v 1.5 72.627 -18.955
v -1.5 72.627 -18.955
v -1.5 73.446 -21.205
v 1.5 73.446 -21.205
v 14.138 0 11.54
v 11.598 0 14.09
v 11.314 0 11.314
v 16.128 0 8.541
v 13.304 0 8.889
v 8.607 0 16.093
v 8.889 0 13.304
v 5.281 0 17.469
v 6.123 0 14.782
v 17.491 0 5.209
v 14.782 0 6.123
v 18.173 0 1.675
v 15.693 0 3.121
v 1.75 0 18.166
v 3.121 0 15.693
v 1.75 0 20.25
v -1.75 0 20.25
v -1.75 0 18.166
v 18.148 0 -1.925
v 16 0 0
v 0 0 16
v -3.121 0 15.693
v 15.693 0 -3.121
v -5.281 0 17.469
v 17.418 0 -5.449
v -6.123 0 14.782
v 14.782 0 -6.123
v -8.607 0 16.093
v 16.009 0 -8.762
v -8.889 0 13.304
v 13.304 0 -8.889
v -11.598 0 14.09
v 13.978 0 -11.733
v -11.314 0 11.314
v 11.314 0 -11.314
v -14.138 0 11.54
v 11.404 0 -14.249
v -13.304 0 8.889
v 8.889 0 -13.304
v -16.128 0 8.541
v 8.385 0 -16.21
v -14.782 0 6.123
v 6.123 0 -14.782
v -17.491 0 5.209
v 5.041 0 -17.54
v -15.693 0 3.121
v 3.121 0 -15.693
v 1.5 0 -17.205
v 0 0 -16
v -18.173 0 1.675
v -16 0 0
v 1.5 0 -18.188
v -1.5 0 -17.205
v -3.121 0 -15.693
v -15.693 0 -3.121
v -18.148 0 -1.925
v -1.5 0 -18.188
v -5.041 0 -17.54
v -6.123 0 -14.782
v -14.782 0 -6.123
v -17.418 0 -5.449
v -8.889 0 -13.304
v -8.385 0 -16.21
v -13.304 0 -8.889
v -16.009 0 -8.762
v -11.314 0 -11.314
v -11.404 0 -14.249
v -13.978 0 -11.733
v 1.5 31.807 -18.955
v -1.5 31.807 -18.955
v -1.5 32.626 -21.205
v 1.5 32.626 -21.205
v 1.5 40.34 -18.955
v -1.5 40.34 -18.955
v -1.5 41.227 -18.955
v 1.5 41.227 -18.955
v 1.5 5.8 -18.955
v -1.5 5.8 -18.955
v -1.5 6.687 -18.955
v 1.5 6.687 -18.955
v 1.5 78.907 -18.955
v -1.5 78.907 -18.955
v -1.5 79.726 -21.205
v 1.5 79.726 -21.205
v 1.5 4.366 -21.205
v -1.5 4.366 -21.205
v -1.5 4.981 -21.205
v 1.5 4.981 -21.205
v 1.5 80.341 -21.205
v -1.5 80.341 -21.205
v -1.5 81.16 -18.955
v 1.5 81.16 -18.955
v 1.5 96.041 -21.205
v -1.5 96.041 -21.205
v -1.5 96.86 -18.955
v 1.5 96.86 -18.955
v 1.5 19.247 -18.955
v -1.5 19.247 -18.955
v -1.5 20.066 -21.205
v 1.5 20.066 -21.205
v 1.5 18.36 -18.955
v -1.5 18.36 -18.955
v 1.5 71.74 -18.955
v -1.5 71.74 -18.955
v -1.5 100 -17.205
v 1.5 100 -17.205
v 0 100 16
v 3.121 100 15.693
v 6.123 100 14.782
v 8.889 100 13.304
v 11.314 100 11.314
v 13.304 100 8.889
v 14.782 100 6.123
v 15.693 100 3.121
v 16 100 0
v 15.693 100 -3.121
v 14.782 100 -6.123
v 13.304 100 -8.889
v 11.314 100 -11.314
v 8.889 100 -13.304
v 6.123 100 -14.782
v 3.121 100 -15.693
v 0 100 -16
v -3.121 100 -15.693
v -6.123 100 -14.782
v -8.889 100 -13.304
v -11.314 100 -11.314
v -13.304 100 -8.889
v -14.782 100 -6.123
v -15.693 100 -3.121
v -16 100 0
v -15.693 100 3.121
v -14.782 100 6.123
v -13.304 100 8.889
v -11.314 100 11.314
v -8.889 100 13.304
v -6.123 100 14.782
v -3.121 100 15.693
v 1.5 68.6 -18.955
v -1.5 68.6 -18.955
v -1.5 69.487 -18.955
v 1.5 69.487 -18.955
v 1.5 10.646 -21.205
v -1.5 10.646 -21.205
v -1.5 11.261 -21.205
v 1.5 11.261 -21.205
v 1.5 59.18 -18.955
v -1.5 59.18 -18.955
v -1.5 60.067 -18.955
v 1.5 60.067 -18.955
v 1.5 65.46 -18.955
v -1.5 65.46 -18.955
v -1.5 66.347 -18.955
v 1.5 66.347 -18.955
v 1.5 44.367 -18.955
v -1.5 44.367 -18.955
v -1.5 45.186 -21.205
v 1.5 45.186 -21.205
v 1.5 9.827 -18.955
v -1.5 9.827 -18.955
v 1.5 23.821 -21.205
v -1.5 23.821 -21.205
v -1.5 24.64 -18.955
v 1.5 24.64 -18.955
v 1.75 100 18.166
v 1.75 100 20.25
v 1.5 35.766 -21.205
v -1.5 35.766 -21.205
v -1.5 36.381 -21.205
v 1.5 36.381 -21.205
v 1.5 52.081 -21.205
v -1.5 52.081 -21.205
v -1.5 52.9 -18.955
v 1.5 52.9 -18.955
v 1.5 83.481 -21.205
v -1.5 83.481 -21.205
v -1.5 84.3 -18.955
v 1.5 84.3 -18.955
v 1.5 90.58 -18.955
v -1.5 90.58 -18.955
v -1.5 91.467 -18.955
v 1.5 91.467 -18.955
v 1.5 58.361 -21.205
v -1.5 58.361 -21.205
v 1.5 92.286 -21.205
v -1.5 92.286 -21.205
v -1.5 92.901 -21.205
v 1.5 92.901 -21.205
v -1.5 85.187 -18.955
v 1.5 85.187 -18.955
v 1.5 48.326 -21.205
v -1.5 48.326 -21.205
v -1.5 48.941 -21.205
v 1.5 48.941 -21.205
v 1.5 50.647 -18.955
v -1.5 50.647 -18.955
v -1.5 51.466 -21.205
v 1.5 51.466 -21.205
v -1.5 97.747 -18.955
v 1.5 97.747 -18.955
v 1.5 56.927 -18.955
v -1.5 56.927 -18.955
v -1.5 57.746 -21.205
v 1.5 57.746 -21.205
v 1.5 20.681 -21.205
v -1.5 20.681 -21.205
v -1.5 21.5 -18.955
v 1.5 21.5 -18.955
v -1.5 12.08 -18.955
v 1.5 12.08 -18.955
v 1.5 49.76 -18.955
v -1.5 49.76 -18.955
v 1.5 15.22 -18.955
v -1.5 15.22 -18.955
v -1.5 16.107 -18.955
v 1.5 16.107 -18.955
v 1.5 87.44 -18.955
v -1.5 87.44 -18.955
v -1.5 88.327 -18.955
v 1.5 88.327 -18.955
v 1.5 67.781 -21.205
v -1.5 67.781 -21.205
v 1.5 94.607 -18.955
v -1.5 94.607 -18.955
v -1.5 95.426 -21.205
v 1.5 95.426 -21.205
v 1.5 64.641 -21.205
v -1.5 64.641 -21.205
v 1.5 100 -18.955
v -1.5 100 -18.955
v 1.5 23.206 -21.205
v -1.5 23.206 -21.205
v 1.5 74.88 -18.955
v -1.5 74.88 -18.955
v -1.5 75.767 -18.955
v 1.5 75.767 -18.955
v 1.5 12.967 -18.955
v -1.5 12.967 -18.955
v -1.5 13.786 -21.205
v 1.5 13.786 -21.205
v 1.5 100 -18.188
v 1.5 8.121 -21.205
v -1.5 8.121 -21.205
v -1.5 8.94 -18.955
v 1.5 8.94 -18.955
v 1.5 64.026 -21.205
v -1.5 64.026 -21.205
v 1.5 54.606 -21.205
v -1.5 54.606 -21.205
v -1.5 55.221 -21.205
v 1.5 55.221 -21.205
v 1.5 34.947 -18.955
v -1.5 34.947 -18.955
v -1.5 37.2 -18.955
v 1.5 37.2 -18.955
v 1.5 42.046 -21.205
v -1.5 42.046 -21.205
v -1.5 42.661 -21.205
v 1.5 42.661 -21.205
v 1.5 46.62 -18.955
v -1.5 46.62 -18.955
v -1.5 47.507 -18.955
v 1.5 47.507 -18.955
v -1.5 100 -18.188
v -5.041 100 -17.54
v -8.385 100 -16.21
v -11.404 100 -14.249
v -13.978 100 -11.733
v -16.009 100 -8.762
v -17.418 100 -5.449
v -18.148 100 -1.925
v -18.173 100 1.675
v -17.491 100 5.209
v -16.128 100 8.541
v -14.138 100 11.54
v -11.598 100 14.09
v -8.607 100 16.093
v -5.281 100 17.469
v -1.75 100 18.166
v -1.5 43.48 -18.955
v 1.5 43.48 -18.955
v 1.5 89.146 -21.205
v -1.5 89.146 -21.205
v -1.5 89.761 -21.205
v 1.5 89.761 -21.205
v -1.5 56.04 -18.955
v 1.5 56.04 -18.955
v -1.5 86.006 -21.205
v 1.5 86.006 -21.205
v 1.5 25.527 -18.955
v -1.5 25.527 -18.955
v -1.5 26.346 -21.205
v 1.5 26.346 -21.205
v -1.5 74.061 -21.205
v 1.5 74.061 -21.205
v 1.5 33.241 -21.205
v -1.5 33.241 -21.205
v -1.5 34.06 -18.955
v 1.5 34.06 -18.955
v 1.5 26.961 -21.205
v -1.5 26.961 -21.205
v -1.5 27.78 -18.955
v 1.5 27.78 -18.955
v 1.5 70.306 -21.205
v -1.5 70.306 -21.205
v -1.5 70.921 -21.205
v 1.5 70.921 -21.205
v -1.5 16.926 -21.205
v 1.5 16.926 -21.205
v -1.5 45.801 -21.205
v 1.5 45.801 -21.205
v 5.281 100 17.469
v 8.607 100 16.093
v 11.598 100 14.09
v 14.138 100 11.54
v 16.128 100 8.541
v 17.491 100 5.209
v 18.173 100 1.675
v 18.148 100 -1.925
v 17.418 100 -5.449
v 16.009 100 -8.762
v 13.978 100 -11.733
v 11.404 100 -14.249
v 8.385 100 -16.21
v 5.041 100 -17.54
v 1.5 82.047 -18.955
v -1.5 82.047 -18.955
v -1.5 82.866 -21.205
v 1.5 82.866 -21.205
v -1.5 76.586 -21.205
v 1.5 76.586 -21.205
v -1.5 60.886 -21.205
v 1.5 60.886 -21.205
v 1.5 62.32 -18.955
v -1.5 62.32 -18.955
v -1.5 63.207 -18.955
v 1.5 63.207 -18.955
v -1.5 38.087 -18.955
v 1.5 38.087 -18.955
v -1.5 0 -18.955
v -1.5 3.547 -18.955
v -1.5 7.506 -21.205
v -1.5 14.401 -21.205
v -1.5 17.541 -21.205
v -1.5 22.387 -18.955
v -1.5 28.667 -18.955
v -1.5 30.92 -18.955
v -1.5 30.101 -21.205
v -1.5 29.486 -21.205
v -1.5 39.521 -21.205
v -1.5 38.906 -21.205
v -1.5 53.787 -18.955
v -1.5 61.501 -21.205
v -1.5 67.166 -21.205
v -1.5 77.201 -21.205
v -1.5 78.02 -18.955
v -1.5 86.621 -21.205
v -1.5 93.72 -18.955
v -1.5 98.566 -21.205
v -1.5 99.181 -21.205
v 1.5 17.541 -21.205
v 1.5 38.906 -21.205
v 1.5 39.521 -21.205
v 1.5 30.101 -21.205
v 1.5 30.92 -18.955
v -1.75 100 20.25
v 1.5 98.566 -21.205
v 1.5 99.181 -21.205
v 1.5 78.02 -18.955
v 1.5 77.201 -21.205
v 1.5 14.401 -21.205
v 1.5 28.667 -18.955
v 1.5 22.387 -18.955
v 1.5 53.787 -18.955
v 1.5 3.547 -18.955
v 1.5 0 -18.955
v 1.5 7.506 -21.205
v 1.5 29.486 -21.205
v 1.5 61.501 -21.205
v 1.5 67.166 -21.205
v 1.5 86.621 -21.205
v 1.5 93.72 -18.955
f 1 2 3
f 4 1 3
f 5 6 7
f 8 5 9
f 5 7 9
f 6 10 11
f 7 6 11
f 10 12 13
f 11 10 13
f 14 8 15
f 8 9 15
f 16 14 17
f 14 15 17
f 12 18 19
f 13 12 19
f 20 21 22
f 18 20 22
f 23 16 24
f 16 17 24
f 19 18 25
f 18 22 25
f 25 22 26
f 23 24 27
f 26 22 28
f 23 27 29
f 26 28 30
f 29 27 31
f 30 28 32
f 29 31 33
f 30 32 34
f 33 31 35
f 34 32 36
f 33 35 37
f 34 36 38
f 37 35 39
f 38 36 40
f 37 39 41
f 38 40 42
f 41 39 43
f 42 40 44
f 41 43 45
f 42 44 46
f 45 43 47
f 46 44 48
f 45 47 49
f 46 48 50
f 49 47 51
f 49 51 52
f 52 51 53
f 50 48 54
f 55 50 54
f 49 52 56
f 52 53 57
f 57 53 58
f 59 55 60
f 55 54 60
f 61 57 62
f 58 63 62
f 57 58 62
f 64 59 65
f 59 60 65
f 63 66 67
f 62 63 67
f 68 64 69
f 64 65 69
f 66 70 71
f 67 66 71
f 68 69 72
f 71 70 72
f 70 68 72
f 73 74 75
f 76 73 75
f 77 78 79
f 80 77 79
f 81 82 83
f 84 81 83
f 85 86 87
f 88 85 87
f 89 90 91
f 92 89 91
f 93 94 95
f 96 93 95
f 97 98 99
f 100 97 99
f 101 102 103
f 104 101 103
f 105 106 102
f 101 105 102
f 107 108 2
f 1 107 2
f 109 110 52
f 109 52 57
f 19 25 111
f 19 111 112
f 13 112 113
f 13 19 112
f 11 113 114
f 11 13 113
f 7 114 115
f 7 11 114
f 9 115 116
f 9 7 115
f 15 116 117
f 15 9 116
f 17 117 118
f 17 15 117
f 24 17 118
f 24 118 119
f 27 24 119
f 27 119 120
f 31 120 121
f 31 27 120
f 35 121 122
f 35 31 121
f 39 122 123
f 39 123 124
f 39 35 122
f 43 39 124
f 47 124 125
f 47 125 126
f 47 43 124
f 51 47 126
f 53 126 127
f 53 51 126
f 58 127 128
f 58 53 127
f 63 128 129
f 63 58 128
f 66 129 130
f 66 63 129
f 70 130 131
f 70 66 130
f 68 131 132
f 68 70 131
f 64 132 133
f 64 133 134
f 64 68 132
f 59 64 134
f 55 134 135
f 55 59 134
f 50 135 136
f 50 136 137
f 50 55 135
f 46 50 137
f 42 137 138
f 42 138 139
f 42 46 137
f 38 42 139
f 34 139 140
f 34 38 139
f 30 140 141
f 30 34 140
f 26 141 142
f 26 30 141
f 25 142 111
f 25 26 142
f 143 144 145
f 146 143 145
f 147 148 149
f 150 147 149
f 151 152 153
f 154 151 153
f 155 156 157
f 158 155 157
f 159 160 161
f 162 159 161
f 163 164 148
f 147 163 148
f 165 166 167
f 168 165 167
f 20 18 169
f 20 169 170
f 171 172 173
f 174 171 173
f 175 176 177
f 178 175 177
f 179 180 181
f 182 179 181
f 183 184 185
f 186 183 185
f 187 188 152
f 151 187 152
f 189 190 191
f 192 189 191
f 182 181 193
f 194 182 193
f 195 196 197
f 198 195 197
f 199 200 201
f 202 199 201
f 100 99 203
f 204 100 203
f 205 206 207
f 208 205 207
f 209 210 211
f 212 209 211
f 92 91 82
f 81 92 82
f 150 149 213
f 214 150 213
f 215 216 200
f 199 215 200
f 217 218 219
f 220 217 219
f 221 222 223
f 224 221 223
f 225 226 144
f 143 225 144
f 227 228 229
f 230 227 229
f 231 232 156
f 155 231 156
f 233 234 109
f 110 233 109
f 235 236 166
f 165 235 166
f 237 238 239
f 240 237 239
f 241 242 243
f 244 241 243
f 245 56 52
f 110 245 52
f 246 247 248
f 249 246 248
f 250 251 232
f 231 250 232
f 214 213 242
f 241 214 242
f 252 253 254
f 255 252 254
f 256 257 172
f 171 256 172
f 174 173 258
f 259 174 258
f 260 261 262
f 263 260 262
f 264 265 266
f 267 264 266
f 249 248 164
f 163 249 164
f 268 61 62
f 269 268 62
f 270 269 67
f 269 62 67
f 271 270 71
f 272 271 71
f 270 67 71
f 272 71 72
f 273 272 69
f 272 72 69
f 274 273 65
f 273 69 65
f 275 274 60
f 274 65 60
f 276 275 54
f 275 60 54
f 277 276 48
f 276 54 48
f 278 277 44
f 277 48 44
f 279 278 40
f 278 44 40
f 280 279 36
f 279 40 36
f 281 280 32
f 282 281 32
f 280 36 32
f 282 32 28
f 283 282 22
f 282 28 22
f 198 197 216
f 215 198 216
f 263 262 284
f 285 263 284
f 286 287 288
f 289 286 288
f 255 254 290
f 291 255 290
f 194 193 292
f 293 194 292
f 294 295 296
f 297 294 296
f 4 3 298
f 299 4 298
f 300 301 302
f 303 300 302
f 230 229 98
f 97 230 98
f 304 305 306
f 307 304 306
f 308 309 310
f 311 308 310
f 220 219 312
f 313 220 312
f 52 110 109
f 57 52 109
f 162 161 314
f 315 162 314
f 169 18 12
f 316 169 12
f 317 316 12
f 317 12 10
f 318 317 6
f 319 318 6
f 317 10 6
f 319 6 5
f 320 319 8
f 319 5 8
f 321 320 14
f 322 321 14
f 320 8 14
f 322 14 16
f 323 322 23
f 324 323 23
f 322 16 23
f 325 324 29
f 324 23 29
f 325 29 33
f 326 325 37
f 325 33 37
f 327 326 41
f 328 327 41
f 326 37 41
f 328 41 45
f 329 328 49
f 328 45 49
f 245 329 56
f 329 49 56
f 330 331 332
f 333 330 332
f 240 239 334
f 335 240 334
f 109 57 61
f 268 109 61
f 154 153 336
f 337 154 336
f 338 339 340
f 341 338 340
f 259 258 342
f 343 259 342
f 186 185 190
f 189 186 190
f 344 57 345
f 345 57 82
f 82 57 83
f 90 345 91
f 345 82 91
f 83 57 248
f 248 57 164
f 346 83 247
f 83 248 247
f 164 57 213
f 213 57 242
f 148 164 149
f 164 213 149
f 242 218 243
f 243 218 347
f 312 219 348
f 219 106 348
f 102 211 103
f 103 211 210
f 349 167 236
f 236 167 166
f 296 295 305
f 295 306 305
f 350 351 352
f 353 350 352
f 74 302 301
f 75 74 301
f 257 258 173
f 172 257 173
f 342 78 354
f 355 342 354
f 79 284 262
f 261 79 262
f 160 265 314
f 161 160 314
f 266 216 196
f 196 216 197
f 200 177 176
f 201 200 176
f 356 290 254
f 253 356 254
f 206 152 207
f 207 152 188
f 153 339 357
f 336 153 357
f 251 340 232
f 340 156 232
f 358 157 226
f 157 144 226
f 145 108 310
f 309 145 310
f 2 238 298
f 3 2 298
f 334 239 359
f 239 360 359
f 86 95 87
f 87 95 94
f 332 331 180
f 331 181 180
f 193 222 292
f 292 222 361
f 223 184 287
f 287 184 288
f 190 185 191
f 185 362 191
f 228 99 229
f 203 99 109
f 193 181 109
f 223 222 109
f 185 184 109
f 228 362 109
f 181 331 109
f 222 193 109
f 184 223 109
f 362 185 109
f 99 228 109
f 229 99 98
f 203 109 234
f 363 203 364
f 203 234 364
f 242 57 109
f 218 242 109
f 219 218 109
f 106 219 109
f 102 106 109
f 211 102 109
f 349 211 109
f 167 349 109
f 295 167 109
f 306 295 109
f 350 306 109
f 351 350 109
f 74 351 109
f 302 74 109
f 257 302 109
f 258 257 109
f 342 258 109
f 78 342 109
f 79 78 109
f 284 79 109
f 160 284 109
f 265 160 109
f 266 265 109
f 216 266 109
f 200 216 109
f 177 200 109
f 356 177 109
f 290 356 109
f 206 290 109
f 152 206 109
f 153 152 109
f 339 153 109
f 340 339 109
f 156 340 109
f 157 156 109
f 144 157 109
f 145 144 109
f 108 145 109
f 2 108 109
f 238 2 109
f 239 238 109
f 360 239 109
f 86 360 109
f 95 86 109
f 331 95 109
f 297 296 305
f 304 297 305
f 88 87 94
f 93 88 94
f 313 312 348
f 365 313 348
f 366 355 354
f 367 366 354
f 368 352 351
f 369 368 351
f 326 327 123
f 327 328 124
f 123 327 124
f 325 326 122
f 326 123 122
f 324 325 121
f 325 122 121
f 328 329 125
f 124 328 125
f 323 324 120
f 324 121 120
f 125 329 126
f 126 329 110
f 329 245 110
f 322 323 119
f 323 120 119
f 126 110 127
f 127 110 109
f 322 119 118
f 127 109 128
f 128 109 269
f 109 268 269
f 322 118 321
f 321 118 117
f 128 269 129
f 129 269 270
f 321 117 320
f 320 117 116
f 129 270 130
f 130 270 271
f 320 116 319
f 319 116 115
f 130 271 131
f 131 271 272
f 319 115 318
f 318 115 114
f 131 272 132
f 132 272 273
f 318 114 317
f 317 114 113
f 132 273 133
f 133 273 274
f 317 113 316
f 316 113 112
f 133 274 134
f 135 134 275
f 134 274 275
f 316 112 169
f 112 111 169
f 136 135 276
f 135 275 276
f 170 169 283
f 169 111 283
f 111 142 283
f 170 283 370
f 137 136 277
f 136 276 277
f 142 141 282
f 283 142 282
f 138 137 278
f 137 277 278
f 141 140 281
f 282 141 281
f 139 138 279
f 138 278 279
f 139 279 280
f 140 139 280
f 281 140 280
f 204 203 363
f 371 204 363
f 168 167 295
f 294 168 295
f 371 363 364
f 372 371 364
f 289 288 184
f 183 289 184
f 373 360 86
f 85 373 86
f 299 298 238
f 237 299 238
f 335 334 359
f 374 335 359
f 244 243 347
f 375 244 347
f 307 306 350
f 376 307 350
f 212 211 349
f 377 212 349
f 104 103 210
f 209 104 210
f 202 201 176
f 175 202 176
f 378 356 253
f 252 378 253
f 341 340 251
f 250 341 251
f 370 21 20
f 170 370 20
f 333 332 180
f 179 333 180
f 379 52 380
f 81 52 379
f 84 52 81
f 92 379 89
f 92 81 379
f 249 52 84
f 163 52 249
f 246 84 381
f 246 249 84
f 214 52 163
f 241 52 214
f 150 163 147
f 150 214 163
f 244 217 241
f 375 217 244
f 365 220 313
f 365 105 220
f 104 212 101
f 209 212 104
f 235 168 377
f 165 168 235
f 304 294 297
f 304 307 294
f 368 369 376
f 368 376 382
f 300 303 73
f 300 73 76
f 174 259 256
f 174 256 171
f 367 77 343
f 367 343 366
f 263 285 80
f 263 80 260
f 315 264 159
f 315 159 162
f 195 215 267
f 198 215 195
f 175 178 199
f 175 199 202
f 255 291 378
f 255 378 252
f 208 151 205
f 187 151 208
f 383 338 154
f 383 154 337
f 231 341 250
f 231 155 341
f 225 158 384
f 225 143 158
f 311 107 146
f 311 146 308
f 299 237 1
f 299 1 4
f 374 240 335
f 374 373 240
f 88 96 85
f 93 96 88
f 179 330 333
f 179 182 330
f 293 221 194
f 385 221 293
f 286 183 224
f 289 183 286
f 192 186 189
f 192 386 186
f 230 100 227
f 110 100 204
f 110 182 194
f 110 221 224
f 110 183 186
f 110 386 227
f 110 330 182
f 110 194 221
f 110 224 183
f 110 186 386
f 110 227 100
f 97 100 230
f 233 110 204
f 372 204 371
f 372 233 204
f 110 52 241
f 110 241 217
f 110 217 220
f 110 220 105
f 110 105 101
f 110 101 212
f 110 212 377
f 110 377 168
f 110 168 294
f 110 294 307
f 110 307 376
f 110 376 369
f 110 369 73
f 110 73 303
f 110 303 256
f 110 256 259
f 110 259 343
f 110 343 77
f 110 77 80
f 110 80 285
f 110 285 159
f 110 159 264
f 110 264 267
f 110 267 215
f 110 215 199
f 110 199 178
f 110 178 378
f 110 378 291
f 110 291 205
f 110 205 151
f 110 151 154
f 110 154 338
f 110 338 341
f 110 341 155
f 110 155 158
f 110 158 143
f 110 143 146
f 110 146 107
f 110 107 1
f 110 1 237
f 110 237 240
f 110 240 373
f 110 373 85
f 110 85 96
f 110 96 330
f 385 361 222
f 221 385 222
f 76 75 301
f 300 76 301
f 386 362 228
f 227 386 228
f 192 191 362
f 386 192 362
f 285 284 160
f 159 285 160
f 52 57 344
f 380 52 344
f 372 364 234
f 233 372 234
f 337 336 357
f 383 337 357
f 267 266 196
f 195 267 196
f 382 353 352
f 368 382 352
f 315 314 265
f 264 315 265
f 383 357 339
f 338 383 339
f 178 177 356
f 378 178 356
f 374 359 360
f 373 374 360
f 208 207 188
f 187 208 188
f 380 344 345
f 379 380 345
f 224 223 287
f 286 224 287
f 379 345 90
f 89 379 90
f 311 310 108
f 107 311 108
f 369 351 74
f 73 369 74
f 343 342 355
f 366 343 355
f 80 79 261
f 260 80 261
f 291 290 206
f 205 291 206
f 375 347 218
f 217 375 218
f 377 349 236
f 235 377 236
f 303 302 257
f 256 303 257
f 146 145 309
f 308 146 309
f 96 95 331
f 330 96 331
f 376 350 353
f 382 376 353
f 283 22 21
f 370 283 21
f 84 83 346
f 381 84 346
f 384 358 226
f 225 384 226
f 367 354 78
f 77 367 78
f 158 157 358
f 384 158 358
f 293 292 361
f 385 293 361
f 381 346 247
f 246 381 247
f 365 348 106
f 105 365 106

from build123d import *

# Parameters (mm, degrees)
SKETCH_1_R                     = 18.25
SKETCH_1_R_2                   = 16
EXTRUDE_1_DEPTH                = 100
EXTRUDE_2_DEPTH                = 1.5
EXTRUDE_2_DEPTH_BACK           = 1.5
SKETCH_5_W                     = 3.5
SKETCH_5_H                     = 4
EXTRUDE_4_DEPTH                = 100
SPLIT_BODIES_2_SURFACE_1_BACK  = 115.24
SPLIT_BODIES_2_SURFACE_1_DEPTH = 230.48
SPLIT_BODIES_2_SURFACE_2_BACK  = 115.24
SPLIT_BODIES_2_SURFACE_2_DEPTH = 230.48


with BuildPart() as part:
    # Эскиз1 → Бобышка-Вытянуть1 (new body)
    with BuildSketch(Plane(origin=(0, 0, 0), x_dir=(1, 0, 0), z_dir=(0, 1, 0))):
        with Locations(Location((0, 0, 0), (0, 0, 270))):
            Circle(SKETCH_1_R)
        with Locations(Location((0, 0, 0), (0, 0, 270))):
            Circle(SKETCH_1_R_2, mode=Mode.SUBTRACT)
    extrude(amount=EXTRUDE_1_DEPTH)

    # Эскиз3 → Бобышка-Вытянуть2 (add, two sides: drawn at the far end of the back side and taken through both)
    with BuildSketch(Plane(origin=(0, 0, 0), x_dir=(0, 0, -1), z_dir=(1, 0, 0)).offset(-EXTRUDE_2_DEPTH_BACK)):
        Polygon((21.205212662, 96.041066973), (18.955212662, 96.86), (18.955212662, 97.747278089), (21.205212662, 98.566211116), (21.205212662, 99.181066973), (18.955212662, 100), (17.205212662, 100), (17.205212662, 0), (18.955212662, 0), (18.955212662, 2.65840735), (18.955212662, 3.547278089), (21.205212662, 4.366211116), (21.205212662, 4.981066973), (18.955212662, 5.8), (18.955212662, 6.687278089), (21.205212662, 7.506211116), (21.205212662, 8.121066973), (18.955212662, 8.94), (18.955212662, 9.827278089), (21.205212662, 10.646211116), (21.205212662, 11.261066973), (18.955212662, 12.08), (18.955212662, 12.967278089), (21.205212662, 13.786211116), (21.205212662, 14.401066973), (18.955212662, 15.22), (18.955212662, 16.107278089), (21.205212662, 16.926211116), (21.205212662, 17.541066973), (18.955212662, 18.36), (18.955212662, 19.247278089), (21.205212662, 20.066211116), (21.205212662, 20.681066973), (18.955212662, 21.5), (18.955212662, 22.387278089), (21.205212662, 23.206211116), (21.205212662, 23.821066973), (18.955212662, 24.64), (18.955212662, 25.527278089), (21.205212662, 26.346211116), (21.205212662, 26.961066973), (18.955212662, 27.78), (18.955212662, 28.667278089), (21.205212662, 29.486211116), (21.205212662, 30.101066973), (18.955212662, 30.92), (18.955212662, 31.807278089), (21.205212662, 32.626211116), (21.205212662, 33.241066973), (18.955212662, 34.06), (18.955212662, 34.947278089), (21.205212662, 35.766211116), (21.205212662, 36.381066973), (18.955212662, 37.2), (18.955212662, 38.087278089), (21.205212662, 38.906211116), (21.205212662, 39.521066973), (18.955212662, 40.34), (18.955212662, 41.227278089), (21.205212662, 42.046211116), (21.205212662, 42.661066973), (18.955212662, 43.48), (18.955212662, 44.367278089), (21.205212662, 45.186211116), (21.205212662, 45.801066973), (18.955212662, 46.62), (18.955212662, 47.507278089), (21.205212662, 48.326211116), (21.205212662, 48.941066973), (18.955212662, 49.76), (18.955212662, 50.647278089), (21.205212662, 51.466211116), (21.205212662, 52.081066973), (18.955212662, 52.9), (18.955212662, 53.787278089), (21.205212662, 54.606211116), (21.205212662, 55.221066973), (18.955212662, 56.04), (18.955212662, 56.927278089), (21.205212662, 57.746211116), (21.205212662, 58.361066973), (18.955212662, 59.18), (18.955212662, 60.067278089), (21.205212662, 60.886211116), (21.205212662, 61.501066973), (18.955212662, 62.32), (18.955212662, 63.207278089), (21.205212662, 64.026211116), (21.205212662, 64.641066973), (18.955212662, 65.46), (18.955212662, 66.347278089), (21.205212662, 67.166211116), (21.205212662, 67.781066973), (18.955212662, 68.6), (18.955212662, 69.487278089), (21.205212662, 70.306211116), (21.205212662, 70.921066973), (18.955212662, 71.74), (18.955212662, 72.627278089), (21.205212662, 73.446211116), (21.205212662, 74.061066973), (18.955212662, 74.88), (18.955212662, 75.767278089), (21.205212662, 76.586211116), (21.205212662, 77.201066973), (18.955212662, 78.02), (18.955212662, 78.907278089), (21.205212662, 79.726211116), (21.205212662, 80.341066973), (18.955212662, 81.16), (18.955212662, 82.047278089), (21.205212662, 82.866211116), (21.205212662, 83.481066973), (18.955212662, 84.3), (18.955212662, 85.187278089), (21.205212662, 86.006211116), (21.205212662, 86.621066973), (18.955212662, 87.44), (18.955212662, 88.327278089), (21.205212662, 89.146211116), (21.205212662, 89.761066973), (18.955212662, 90.58), (18.955212662, 91.467278089), (21.205212662, 92.286211116), (21.205212662, 92.901066973), (18.955212662, 93.72), (18.955212662, 94.607278089), (21.205212662, 95.426211116), align=None)
    extrude(amount=EXTRUDE_2_DEPTH + EXTRUDE_2_DEPTH_BACK)

    # Эскиз5 → Бобышка-Вытянуть4 (add)
    with BuildSketch(Plane.XZ):
        with Locations((0, 18.25)):
            Rectangle(SKETCH_5_W, SKETCH_5_H)
    extrude(amount=-EXTRUDE_4_DEPTH)


with BuildPart() as body_2:
    # Split Bodies 2: the piece behind the surface
    add(part.part)
    # Split Bodies 2 surface: a surface, the sketch's curves swept straight by 230.48 mm
    with BuildLine(Plane(origin=(0, 100, 0), x_dir=(1, 0, 0), z_dir=(0, 1, 0)).offset(-SPLIT_BODIES_2_SURFACE_1_BACK), mode=Mode.PRIVATE) as split_bodies_2_surface_1_path:
        Line((1.5, 21.205212662), (1.5, 17.205212662))
        Line((1.5, 17.205212662), (-1.5, 17.205212662))
        Line((-1.5, 17.205212662), (-1.5, 21.205212662))
    split_bodies_2_surface_1 = Shell.extrude(split_bodies_2_surface_1_path.wire(), (0 * SPLIT_BODIES_2_SURFACE_1_DEPTH, 1 * SPLIT_BODIES_2_SURFACE_1_DEPTH, 0 * SPLIT_BODIES_2_SURFACE_1_DEPTH))
    split(bisect_by=split_bodies_2_surface_1, keep=Keep.BOTTOM)


with BuildPart() as part_1:
    add(part.part)

    # Split Bodies 2: split by a surface, the side it looks to stays
    # Split Bodies 2 surface: a surface, the sketch's curves swept straight by 230.48 mm
    with BuildLine(Plane(origin=(0, 100, 0), x_dir=(1, 0, 0), z_dir=(0, 1, 0)).offset(-SPLIT_BODIES_2_SURFACE_2_BACK), mode=Mode.PRIVATE) as split_bodies_2_surface_2_path:
        Line((1.5, 21.205212662), (1.5, 17.205212662))
        Line((1.5, 17.205212662), (-1.5, 17.205212662))
        Line((-1.5, 17.205212662), (-1.5, 21.205212662))
    split_bodies_2_surface_2 = Shell.extrude(split_bodies_2_surface_2_path.wire(), (0 * SPLIT_BODIES_2_SURFACE_2_DEPTH, 1 * SPLIT_BODIES_2_SURFACE_2_DEPTH, 0 * SPLIT_BODIES_2_SURFACE_2_DEPTH))
    split(bisect_by=split_bodies_2_surface_2, keep=Keep.TOP)


solid = Compound([body_2.part, part_1.part])
